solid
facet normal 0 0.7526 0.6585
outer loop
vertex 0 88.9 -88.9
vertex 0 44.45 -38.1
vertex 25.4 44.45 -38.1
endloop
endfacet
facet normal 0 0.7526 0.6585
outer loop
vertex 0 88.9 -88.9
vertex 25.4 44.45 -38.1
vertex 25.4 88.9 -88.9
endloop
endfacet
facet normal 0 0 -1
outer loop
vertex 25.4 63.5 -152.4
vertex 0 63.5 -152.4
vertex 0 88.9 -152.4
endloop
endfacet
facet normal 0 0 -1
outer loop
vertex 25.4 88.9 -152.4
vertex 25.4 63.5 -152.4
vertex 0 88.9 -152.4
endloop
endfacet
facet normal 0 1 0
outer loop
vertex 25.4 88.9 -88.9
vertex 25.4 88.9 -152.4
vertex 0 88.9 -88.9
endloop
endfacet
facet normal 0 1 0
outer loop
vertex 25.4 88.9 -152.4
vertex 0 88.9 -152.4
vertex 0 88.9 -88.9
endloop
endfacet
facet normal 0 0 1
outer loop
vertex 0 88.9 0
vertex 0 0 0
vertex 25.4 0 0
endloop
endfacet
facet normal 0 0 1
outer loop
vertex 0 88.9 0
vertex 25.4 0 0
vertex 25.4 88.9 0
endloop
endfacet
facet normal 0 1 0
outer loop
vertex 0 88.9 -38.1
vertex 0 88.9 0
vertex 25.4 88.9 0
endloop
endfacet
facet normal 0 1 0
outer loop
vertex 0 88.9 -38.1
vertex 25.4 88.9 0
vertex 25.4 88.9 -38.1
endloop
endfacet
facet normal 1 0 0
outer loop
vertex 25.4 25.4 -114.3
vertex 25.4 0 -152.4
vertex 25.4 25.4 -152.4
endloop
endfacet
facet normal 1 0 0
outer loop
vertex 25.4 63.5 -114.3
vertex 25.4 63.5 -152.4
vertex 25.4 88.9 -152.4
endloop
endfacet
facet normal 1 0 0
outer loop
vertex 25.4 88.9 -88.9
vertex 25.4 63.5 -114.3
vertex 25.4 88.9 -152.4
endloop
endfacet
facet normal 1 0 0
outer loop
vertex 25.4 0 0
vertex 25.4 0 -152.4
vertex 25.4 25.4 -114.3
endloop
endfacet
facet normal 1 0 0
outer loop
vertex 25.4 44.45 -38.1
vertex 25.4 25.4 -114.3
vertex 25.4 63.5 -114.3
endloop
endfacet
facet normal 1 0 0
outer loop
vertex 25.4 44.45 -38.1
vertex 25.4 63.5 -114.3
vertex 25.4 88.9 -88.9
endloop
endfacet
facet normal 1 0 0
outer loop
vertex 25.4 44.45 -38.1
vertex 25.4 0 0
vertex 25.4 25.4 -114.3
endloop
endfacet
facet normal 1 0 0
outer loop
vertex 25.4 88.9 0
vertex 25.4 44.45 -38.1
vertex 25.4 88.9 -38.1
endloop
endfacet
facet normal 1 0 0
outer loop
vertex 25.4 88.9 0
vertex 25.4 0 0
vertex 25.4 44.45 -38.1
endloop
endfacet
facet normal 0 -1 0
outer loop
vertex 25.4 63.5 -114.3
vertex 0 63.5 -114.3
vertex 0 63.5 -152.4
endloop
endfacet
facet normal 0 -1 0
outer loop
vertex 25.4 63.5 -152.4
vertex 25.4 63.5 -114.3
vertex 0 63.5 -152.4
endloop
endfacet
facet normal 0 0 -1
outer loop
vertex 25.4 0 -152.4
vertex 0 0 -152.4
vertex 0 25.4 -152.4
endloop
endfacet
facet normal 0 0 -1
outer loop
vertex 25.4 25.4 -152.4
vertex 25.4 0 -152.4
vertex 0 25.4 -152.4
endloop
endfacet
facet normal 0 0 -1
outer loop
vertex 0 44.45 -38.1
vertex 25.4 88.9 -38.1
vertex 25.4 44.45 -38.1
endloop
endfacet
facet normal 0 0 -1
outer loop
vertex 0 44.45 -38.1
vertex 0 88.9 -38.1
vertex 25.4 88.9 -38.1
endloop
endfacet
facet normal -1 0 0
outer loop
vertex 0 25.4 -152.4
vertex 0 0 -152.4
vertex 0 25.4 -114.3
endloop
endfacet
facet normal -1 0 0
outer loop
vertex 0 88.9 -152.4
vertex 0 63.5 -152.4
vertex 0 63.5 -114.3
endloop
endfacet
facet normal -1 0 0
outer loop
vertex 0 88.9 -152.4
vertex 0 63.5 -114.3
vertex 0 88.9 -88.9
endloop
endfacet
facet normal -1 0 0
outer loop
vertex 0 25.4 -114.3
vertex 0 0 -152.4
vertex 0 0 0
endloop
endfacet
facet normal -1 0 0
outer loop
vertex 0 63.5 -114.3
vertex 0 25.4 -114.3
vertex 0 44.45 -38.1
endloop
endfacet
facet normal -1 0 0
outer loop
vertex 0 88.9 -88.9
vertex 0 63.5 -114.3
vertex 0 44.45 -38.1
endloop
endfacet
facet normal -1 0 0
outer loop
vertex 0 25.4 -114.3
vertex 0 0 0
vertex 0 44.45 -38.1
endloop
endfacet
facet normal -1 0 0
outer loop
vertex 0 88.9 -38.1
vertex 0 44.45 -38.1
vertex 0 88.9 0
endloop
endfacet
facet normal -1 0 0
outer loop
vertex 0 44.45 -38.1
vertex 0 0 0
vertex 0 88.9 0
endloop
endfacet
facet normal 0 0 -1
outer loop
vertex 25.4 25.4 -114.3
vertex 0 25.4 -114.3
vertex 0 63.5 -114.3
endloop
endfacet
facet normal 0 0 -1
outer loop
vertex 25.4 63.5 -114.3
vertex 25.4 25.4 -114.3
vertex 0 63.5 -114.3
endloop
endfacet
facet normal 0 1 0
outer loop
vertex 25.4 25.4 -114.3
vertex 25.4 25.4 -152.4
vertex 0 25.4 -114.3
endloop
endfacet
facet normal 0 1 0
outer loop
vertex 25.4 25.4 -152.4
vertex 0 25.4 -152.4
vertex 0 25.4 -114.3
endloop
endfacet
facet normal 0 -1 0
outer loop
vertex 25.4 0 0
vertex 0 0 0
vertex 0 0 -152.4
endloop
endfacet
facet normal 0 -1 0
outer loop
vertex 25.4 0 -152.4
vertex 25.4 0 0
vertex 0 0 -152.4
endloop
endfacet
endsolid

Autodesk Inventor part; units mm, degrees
ref_plane "YZ Plane" through (0, 0, 0) normal (1, 0, 0) x (0, 1, 0)
ref_plane "XZ Plane" through (0, 0, 0) normal (0, 1, 0) x (-1, 0, 0)
ref_plane "XY Plane" through (0, 0, 0) normal (0, 0, 1) x (1, 0, 0)
sketch "Sketch1" plane through (0, 0, 0) normal (1, 0, 0) x (0, 1, 0)
  line L0 (0, 0) -> (0, -152.4)
  line L1 (0, -152.4) -> (25.4, -152.4)
  line L2 (25.4, -152.4) -> (25.4, -114.3)
  line L3 (25.4, -114.3) -> (63.5, -114.3)
  line L4 (63.5, -114.3) -> (63.5, -152.4)
  line L5 (63.5, -152.4) -> (88.9, -152.4)
  line L6 (88.9, -152.4) -> (88.9, -88.9)
  line L7 (0, 0) -> (88.9, 0)
  line L8 (88.9, 0) -> (88.9, -38.1)
  line L9 (88.9, -38.1) -> (44.45, -38.1)
  line L10 (44.45, -38.1) -> (88.9, -88.9)
  dimension "d0" = 152.4
extrude "Extrusion1" add sketch "Sketch1" along normal blind 25.4
properties part number "P2-1"
